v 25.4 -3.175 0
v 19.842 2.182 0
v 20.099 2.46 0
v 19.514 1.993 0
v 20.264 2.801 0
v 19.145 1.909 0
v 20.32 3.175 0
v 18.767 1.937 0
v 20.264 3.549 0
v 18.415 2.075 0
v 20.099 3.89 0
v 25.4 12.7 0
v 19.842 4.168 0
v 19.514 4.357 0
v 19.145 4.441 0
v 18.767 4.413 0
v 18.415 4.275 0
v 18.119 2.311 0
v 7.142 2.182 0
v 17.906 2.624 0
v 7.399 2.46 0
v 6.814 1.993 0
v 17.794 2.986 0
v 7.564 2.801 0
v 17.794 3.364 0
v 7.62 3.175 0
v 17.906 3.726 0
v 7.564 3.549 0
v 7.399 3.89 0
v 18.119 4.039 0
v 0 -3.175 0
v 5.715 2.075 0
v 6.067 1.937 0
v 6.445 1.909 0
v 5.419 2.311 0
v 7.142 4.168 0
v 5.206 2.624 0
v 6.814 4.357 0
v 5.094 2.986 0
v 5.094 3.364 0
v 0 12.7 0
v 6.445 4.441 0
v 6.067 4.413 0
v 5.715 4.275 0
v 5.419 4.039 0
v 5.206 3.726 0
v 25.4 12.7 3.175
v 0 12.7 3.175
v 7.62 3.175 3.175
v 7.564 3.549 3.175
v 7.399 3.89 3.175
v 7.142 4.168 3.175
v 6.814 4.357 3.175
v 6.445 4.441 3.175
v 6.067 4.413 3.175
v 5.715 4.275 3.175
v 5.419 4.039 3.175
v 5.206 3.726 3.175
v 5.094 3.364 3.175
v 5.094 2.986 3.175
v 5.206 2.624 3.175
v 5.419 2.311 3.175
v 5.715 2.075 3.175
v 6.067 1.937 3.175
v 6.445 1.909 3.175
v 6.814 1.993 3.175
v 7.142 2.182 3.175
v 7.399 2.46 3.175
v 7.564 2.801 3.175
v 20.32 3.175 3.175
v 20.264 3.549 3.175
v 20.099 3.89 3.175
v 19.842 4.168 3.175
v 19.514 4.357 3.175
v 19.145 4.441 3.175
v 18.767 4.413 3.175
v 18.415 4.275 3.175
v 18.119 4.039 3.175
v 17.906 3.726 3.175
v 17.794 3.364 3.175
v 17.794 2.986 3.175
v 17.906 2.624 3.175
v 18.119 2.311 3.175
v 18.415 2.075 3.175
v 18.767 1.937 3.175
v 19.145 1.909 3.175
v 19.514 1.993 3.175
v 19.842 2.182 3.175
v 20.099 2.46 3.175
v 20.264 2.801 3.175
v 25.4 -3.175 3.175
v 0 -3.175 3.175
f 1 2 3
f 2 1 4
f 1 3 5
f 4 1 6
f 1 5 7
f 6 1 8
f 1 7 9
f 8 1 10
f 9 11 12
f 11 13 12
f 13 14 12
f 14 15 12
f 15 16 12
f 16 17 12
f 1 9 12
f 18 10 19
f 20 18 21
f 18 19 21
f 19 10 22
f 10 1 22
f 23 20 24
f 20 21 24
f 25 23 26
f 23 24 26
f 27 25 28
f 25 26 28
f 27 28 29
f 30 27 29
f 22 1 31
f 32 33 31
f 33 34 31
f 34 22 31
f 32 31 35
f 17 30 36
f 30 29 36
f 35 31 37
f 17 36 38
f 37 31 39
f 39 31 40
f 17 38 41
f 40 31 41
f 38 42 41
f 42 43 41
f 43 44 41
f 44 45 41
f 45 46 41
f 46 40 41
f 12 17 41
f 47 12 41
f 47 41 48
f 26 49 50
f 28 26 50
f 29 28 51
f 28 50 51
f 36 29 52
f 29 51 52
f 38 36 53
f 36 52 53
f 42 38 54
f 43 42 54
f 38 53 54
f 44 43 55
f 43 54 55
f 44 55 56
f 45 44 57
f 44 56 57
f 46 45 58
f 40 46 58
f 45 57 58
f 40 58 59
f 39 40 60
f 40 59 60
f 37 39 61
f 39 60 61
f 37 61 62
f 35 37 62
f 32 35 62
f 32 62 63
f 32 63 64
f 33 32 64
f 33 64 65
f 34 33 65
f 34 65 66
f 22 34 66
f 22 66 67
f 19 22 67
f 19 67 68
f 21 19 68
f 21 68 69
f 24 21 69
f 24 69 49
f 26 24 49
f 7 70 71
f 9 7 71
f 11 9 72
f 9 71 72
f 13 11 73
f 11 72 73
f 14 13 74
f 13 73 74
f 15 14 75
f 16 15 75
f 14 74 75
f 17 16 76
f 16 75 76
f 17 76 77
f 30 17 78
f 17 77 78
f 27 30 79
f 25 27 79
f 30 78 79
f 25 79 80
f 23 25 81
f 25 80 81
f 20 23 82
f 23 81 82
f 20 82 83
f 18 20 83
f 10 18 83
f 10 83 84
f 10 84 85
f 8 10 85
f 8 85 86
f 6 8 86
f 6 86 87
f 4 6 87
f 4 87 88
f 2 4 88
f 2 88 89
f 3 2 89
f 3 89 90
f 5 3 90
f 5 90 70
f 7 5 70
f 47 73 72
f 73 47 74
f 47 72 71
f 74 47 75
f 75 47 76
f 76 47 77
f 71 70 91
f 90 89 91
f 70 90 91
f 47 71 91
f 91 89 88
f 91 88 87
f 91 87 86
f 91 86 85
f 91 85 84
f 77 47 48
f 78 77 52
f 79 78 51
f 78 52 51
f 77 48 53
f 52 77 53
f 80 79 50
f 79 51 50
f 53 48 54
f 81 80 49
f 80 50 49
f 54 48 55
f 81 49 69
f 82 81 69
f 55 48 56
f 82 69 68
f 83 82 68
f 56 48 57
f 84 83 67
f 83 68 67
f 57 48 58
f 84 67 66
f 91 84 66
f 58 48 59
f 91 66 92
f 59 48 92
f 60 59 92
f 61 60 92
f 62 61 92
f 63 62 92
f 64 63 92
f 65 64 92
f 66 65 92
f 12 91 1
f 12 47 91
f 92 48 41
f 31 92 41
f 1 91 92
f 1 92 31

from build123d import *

# Parameters (mm, degrees)
BOSS_EXTRUDE1_DEPTH = 25.4
SKETCH2_R           = 1.27
CUT_EXTRUDE1_DEPTH  = 25.4
SKETCH3_W           = 25.4
SKETCH3_H           = 3.175
CUT_EXTRUDE2_DEPTH  = 10.668


with BuildPart() as part:
    # Sketch1 → Boss-Extrude1 (new body)
    with BuildSketch(Plane(origin=(0, 0, 0), x_dir=(0, 0, -1), z_dir=(1, 0, 0))):
        Polygon((0, 0), (0, 12.7), (-3.175, 12.7), (-3.175, -3.175), (10.668, -3.175), (10.668, 0), align=None)
    extrude(amount=BOSS_EXTRUDE1_DEPTH)

    # Sketch2 → Cut-Extrude1 (cut)
    with BuildSketch(Plane.XY.offset(3.175)):
        with Locations((6.35, 3.175)):
            Circle(SKETCH2_R)
        with Locations((19.05, 3.175)):
            Circle(SKETCH2_R)
    extrude(amount=-CUT_EXTRUDE1_DEPTH, mode=Mode.SUBTRACT)

    # Sketch3 → Cut-Extrude2 (cut)
    with BuildSketch(Plane(origin=(0, 0, -10.668), x_dir=(-1, 0, 0), z_dir=(0, 0, -1))):
        with Locations((-12.7, -1.5875)):
            Rectangle(SKETCH3_W, SKETCH3_H)
    extrude(amount=-CUT_EXTRUDE2_DEPTH, mode=Mode.SUBTRACT)


solid = part.part
